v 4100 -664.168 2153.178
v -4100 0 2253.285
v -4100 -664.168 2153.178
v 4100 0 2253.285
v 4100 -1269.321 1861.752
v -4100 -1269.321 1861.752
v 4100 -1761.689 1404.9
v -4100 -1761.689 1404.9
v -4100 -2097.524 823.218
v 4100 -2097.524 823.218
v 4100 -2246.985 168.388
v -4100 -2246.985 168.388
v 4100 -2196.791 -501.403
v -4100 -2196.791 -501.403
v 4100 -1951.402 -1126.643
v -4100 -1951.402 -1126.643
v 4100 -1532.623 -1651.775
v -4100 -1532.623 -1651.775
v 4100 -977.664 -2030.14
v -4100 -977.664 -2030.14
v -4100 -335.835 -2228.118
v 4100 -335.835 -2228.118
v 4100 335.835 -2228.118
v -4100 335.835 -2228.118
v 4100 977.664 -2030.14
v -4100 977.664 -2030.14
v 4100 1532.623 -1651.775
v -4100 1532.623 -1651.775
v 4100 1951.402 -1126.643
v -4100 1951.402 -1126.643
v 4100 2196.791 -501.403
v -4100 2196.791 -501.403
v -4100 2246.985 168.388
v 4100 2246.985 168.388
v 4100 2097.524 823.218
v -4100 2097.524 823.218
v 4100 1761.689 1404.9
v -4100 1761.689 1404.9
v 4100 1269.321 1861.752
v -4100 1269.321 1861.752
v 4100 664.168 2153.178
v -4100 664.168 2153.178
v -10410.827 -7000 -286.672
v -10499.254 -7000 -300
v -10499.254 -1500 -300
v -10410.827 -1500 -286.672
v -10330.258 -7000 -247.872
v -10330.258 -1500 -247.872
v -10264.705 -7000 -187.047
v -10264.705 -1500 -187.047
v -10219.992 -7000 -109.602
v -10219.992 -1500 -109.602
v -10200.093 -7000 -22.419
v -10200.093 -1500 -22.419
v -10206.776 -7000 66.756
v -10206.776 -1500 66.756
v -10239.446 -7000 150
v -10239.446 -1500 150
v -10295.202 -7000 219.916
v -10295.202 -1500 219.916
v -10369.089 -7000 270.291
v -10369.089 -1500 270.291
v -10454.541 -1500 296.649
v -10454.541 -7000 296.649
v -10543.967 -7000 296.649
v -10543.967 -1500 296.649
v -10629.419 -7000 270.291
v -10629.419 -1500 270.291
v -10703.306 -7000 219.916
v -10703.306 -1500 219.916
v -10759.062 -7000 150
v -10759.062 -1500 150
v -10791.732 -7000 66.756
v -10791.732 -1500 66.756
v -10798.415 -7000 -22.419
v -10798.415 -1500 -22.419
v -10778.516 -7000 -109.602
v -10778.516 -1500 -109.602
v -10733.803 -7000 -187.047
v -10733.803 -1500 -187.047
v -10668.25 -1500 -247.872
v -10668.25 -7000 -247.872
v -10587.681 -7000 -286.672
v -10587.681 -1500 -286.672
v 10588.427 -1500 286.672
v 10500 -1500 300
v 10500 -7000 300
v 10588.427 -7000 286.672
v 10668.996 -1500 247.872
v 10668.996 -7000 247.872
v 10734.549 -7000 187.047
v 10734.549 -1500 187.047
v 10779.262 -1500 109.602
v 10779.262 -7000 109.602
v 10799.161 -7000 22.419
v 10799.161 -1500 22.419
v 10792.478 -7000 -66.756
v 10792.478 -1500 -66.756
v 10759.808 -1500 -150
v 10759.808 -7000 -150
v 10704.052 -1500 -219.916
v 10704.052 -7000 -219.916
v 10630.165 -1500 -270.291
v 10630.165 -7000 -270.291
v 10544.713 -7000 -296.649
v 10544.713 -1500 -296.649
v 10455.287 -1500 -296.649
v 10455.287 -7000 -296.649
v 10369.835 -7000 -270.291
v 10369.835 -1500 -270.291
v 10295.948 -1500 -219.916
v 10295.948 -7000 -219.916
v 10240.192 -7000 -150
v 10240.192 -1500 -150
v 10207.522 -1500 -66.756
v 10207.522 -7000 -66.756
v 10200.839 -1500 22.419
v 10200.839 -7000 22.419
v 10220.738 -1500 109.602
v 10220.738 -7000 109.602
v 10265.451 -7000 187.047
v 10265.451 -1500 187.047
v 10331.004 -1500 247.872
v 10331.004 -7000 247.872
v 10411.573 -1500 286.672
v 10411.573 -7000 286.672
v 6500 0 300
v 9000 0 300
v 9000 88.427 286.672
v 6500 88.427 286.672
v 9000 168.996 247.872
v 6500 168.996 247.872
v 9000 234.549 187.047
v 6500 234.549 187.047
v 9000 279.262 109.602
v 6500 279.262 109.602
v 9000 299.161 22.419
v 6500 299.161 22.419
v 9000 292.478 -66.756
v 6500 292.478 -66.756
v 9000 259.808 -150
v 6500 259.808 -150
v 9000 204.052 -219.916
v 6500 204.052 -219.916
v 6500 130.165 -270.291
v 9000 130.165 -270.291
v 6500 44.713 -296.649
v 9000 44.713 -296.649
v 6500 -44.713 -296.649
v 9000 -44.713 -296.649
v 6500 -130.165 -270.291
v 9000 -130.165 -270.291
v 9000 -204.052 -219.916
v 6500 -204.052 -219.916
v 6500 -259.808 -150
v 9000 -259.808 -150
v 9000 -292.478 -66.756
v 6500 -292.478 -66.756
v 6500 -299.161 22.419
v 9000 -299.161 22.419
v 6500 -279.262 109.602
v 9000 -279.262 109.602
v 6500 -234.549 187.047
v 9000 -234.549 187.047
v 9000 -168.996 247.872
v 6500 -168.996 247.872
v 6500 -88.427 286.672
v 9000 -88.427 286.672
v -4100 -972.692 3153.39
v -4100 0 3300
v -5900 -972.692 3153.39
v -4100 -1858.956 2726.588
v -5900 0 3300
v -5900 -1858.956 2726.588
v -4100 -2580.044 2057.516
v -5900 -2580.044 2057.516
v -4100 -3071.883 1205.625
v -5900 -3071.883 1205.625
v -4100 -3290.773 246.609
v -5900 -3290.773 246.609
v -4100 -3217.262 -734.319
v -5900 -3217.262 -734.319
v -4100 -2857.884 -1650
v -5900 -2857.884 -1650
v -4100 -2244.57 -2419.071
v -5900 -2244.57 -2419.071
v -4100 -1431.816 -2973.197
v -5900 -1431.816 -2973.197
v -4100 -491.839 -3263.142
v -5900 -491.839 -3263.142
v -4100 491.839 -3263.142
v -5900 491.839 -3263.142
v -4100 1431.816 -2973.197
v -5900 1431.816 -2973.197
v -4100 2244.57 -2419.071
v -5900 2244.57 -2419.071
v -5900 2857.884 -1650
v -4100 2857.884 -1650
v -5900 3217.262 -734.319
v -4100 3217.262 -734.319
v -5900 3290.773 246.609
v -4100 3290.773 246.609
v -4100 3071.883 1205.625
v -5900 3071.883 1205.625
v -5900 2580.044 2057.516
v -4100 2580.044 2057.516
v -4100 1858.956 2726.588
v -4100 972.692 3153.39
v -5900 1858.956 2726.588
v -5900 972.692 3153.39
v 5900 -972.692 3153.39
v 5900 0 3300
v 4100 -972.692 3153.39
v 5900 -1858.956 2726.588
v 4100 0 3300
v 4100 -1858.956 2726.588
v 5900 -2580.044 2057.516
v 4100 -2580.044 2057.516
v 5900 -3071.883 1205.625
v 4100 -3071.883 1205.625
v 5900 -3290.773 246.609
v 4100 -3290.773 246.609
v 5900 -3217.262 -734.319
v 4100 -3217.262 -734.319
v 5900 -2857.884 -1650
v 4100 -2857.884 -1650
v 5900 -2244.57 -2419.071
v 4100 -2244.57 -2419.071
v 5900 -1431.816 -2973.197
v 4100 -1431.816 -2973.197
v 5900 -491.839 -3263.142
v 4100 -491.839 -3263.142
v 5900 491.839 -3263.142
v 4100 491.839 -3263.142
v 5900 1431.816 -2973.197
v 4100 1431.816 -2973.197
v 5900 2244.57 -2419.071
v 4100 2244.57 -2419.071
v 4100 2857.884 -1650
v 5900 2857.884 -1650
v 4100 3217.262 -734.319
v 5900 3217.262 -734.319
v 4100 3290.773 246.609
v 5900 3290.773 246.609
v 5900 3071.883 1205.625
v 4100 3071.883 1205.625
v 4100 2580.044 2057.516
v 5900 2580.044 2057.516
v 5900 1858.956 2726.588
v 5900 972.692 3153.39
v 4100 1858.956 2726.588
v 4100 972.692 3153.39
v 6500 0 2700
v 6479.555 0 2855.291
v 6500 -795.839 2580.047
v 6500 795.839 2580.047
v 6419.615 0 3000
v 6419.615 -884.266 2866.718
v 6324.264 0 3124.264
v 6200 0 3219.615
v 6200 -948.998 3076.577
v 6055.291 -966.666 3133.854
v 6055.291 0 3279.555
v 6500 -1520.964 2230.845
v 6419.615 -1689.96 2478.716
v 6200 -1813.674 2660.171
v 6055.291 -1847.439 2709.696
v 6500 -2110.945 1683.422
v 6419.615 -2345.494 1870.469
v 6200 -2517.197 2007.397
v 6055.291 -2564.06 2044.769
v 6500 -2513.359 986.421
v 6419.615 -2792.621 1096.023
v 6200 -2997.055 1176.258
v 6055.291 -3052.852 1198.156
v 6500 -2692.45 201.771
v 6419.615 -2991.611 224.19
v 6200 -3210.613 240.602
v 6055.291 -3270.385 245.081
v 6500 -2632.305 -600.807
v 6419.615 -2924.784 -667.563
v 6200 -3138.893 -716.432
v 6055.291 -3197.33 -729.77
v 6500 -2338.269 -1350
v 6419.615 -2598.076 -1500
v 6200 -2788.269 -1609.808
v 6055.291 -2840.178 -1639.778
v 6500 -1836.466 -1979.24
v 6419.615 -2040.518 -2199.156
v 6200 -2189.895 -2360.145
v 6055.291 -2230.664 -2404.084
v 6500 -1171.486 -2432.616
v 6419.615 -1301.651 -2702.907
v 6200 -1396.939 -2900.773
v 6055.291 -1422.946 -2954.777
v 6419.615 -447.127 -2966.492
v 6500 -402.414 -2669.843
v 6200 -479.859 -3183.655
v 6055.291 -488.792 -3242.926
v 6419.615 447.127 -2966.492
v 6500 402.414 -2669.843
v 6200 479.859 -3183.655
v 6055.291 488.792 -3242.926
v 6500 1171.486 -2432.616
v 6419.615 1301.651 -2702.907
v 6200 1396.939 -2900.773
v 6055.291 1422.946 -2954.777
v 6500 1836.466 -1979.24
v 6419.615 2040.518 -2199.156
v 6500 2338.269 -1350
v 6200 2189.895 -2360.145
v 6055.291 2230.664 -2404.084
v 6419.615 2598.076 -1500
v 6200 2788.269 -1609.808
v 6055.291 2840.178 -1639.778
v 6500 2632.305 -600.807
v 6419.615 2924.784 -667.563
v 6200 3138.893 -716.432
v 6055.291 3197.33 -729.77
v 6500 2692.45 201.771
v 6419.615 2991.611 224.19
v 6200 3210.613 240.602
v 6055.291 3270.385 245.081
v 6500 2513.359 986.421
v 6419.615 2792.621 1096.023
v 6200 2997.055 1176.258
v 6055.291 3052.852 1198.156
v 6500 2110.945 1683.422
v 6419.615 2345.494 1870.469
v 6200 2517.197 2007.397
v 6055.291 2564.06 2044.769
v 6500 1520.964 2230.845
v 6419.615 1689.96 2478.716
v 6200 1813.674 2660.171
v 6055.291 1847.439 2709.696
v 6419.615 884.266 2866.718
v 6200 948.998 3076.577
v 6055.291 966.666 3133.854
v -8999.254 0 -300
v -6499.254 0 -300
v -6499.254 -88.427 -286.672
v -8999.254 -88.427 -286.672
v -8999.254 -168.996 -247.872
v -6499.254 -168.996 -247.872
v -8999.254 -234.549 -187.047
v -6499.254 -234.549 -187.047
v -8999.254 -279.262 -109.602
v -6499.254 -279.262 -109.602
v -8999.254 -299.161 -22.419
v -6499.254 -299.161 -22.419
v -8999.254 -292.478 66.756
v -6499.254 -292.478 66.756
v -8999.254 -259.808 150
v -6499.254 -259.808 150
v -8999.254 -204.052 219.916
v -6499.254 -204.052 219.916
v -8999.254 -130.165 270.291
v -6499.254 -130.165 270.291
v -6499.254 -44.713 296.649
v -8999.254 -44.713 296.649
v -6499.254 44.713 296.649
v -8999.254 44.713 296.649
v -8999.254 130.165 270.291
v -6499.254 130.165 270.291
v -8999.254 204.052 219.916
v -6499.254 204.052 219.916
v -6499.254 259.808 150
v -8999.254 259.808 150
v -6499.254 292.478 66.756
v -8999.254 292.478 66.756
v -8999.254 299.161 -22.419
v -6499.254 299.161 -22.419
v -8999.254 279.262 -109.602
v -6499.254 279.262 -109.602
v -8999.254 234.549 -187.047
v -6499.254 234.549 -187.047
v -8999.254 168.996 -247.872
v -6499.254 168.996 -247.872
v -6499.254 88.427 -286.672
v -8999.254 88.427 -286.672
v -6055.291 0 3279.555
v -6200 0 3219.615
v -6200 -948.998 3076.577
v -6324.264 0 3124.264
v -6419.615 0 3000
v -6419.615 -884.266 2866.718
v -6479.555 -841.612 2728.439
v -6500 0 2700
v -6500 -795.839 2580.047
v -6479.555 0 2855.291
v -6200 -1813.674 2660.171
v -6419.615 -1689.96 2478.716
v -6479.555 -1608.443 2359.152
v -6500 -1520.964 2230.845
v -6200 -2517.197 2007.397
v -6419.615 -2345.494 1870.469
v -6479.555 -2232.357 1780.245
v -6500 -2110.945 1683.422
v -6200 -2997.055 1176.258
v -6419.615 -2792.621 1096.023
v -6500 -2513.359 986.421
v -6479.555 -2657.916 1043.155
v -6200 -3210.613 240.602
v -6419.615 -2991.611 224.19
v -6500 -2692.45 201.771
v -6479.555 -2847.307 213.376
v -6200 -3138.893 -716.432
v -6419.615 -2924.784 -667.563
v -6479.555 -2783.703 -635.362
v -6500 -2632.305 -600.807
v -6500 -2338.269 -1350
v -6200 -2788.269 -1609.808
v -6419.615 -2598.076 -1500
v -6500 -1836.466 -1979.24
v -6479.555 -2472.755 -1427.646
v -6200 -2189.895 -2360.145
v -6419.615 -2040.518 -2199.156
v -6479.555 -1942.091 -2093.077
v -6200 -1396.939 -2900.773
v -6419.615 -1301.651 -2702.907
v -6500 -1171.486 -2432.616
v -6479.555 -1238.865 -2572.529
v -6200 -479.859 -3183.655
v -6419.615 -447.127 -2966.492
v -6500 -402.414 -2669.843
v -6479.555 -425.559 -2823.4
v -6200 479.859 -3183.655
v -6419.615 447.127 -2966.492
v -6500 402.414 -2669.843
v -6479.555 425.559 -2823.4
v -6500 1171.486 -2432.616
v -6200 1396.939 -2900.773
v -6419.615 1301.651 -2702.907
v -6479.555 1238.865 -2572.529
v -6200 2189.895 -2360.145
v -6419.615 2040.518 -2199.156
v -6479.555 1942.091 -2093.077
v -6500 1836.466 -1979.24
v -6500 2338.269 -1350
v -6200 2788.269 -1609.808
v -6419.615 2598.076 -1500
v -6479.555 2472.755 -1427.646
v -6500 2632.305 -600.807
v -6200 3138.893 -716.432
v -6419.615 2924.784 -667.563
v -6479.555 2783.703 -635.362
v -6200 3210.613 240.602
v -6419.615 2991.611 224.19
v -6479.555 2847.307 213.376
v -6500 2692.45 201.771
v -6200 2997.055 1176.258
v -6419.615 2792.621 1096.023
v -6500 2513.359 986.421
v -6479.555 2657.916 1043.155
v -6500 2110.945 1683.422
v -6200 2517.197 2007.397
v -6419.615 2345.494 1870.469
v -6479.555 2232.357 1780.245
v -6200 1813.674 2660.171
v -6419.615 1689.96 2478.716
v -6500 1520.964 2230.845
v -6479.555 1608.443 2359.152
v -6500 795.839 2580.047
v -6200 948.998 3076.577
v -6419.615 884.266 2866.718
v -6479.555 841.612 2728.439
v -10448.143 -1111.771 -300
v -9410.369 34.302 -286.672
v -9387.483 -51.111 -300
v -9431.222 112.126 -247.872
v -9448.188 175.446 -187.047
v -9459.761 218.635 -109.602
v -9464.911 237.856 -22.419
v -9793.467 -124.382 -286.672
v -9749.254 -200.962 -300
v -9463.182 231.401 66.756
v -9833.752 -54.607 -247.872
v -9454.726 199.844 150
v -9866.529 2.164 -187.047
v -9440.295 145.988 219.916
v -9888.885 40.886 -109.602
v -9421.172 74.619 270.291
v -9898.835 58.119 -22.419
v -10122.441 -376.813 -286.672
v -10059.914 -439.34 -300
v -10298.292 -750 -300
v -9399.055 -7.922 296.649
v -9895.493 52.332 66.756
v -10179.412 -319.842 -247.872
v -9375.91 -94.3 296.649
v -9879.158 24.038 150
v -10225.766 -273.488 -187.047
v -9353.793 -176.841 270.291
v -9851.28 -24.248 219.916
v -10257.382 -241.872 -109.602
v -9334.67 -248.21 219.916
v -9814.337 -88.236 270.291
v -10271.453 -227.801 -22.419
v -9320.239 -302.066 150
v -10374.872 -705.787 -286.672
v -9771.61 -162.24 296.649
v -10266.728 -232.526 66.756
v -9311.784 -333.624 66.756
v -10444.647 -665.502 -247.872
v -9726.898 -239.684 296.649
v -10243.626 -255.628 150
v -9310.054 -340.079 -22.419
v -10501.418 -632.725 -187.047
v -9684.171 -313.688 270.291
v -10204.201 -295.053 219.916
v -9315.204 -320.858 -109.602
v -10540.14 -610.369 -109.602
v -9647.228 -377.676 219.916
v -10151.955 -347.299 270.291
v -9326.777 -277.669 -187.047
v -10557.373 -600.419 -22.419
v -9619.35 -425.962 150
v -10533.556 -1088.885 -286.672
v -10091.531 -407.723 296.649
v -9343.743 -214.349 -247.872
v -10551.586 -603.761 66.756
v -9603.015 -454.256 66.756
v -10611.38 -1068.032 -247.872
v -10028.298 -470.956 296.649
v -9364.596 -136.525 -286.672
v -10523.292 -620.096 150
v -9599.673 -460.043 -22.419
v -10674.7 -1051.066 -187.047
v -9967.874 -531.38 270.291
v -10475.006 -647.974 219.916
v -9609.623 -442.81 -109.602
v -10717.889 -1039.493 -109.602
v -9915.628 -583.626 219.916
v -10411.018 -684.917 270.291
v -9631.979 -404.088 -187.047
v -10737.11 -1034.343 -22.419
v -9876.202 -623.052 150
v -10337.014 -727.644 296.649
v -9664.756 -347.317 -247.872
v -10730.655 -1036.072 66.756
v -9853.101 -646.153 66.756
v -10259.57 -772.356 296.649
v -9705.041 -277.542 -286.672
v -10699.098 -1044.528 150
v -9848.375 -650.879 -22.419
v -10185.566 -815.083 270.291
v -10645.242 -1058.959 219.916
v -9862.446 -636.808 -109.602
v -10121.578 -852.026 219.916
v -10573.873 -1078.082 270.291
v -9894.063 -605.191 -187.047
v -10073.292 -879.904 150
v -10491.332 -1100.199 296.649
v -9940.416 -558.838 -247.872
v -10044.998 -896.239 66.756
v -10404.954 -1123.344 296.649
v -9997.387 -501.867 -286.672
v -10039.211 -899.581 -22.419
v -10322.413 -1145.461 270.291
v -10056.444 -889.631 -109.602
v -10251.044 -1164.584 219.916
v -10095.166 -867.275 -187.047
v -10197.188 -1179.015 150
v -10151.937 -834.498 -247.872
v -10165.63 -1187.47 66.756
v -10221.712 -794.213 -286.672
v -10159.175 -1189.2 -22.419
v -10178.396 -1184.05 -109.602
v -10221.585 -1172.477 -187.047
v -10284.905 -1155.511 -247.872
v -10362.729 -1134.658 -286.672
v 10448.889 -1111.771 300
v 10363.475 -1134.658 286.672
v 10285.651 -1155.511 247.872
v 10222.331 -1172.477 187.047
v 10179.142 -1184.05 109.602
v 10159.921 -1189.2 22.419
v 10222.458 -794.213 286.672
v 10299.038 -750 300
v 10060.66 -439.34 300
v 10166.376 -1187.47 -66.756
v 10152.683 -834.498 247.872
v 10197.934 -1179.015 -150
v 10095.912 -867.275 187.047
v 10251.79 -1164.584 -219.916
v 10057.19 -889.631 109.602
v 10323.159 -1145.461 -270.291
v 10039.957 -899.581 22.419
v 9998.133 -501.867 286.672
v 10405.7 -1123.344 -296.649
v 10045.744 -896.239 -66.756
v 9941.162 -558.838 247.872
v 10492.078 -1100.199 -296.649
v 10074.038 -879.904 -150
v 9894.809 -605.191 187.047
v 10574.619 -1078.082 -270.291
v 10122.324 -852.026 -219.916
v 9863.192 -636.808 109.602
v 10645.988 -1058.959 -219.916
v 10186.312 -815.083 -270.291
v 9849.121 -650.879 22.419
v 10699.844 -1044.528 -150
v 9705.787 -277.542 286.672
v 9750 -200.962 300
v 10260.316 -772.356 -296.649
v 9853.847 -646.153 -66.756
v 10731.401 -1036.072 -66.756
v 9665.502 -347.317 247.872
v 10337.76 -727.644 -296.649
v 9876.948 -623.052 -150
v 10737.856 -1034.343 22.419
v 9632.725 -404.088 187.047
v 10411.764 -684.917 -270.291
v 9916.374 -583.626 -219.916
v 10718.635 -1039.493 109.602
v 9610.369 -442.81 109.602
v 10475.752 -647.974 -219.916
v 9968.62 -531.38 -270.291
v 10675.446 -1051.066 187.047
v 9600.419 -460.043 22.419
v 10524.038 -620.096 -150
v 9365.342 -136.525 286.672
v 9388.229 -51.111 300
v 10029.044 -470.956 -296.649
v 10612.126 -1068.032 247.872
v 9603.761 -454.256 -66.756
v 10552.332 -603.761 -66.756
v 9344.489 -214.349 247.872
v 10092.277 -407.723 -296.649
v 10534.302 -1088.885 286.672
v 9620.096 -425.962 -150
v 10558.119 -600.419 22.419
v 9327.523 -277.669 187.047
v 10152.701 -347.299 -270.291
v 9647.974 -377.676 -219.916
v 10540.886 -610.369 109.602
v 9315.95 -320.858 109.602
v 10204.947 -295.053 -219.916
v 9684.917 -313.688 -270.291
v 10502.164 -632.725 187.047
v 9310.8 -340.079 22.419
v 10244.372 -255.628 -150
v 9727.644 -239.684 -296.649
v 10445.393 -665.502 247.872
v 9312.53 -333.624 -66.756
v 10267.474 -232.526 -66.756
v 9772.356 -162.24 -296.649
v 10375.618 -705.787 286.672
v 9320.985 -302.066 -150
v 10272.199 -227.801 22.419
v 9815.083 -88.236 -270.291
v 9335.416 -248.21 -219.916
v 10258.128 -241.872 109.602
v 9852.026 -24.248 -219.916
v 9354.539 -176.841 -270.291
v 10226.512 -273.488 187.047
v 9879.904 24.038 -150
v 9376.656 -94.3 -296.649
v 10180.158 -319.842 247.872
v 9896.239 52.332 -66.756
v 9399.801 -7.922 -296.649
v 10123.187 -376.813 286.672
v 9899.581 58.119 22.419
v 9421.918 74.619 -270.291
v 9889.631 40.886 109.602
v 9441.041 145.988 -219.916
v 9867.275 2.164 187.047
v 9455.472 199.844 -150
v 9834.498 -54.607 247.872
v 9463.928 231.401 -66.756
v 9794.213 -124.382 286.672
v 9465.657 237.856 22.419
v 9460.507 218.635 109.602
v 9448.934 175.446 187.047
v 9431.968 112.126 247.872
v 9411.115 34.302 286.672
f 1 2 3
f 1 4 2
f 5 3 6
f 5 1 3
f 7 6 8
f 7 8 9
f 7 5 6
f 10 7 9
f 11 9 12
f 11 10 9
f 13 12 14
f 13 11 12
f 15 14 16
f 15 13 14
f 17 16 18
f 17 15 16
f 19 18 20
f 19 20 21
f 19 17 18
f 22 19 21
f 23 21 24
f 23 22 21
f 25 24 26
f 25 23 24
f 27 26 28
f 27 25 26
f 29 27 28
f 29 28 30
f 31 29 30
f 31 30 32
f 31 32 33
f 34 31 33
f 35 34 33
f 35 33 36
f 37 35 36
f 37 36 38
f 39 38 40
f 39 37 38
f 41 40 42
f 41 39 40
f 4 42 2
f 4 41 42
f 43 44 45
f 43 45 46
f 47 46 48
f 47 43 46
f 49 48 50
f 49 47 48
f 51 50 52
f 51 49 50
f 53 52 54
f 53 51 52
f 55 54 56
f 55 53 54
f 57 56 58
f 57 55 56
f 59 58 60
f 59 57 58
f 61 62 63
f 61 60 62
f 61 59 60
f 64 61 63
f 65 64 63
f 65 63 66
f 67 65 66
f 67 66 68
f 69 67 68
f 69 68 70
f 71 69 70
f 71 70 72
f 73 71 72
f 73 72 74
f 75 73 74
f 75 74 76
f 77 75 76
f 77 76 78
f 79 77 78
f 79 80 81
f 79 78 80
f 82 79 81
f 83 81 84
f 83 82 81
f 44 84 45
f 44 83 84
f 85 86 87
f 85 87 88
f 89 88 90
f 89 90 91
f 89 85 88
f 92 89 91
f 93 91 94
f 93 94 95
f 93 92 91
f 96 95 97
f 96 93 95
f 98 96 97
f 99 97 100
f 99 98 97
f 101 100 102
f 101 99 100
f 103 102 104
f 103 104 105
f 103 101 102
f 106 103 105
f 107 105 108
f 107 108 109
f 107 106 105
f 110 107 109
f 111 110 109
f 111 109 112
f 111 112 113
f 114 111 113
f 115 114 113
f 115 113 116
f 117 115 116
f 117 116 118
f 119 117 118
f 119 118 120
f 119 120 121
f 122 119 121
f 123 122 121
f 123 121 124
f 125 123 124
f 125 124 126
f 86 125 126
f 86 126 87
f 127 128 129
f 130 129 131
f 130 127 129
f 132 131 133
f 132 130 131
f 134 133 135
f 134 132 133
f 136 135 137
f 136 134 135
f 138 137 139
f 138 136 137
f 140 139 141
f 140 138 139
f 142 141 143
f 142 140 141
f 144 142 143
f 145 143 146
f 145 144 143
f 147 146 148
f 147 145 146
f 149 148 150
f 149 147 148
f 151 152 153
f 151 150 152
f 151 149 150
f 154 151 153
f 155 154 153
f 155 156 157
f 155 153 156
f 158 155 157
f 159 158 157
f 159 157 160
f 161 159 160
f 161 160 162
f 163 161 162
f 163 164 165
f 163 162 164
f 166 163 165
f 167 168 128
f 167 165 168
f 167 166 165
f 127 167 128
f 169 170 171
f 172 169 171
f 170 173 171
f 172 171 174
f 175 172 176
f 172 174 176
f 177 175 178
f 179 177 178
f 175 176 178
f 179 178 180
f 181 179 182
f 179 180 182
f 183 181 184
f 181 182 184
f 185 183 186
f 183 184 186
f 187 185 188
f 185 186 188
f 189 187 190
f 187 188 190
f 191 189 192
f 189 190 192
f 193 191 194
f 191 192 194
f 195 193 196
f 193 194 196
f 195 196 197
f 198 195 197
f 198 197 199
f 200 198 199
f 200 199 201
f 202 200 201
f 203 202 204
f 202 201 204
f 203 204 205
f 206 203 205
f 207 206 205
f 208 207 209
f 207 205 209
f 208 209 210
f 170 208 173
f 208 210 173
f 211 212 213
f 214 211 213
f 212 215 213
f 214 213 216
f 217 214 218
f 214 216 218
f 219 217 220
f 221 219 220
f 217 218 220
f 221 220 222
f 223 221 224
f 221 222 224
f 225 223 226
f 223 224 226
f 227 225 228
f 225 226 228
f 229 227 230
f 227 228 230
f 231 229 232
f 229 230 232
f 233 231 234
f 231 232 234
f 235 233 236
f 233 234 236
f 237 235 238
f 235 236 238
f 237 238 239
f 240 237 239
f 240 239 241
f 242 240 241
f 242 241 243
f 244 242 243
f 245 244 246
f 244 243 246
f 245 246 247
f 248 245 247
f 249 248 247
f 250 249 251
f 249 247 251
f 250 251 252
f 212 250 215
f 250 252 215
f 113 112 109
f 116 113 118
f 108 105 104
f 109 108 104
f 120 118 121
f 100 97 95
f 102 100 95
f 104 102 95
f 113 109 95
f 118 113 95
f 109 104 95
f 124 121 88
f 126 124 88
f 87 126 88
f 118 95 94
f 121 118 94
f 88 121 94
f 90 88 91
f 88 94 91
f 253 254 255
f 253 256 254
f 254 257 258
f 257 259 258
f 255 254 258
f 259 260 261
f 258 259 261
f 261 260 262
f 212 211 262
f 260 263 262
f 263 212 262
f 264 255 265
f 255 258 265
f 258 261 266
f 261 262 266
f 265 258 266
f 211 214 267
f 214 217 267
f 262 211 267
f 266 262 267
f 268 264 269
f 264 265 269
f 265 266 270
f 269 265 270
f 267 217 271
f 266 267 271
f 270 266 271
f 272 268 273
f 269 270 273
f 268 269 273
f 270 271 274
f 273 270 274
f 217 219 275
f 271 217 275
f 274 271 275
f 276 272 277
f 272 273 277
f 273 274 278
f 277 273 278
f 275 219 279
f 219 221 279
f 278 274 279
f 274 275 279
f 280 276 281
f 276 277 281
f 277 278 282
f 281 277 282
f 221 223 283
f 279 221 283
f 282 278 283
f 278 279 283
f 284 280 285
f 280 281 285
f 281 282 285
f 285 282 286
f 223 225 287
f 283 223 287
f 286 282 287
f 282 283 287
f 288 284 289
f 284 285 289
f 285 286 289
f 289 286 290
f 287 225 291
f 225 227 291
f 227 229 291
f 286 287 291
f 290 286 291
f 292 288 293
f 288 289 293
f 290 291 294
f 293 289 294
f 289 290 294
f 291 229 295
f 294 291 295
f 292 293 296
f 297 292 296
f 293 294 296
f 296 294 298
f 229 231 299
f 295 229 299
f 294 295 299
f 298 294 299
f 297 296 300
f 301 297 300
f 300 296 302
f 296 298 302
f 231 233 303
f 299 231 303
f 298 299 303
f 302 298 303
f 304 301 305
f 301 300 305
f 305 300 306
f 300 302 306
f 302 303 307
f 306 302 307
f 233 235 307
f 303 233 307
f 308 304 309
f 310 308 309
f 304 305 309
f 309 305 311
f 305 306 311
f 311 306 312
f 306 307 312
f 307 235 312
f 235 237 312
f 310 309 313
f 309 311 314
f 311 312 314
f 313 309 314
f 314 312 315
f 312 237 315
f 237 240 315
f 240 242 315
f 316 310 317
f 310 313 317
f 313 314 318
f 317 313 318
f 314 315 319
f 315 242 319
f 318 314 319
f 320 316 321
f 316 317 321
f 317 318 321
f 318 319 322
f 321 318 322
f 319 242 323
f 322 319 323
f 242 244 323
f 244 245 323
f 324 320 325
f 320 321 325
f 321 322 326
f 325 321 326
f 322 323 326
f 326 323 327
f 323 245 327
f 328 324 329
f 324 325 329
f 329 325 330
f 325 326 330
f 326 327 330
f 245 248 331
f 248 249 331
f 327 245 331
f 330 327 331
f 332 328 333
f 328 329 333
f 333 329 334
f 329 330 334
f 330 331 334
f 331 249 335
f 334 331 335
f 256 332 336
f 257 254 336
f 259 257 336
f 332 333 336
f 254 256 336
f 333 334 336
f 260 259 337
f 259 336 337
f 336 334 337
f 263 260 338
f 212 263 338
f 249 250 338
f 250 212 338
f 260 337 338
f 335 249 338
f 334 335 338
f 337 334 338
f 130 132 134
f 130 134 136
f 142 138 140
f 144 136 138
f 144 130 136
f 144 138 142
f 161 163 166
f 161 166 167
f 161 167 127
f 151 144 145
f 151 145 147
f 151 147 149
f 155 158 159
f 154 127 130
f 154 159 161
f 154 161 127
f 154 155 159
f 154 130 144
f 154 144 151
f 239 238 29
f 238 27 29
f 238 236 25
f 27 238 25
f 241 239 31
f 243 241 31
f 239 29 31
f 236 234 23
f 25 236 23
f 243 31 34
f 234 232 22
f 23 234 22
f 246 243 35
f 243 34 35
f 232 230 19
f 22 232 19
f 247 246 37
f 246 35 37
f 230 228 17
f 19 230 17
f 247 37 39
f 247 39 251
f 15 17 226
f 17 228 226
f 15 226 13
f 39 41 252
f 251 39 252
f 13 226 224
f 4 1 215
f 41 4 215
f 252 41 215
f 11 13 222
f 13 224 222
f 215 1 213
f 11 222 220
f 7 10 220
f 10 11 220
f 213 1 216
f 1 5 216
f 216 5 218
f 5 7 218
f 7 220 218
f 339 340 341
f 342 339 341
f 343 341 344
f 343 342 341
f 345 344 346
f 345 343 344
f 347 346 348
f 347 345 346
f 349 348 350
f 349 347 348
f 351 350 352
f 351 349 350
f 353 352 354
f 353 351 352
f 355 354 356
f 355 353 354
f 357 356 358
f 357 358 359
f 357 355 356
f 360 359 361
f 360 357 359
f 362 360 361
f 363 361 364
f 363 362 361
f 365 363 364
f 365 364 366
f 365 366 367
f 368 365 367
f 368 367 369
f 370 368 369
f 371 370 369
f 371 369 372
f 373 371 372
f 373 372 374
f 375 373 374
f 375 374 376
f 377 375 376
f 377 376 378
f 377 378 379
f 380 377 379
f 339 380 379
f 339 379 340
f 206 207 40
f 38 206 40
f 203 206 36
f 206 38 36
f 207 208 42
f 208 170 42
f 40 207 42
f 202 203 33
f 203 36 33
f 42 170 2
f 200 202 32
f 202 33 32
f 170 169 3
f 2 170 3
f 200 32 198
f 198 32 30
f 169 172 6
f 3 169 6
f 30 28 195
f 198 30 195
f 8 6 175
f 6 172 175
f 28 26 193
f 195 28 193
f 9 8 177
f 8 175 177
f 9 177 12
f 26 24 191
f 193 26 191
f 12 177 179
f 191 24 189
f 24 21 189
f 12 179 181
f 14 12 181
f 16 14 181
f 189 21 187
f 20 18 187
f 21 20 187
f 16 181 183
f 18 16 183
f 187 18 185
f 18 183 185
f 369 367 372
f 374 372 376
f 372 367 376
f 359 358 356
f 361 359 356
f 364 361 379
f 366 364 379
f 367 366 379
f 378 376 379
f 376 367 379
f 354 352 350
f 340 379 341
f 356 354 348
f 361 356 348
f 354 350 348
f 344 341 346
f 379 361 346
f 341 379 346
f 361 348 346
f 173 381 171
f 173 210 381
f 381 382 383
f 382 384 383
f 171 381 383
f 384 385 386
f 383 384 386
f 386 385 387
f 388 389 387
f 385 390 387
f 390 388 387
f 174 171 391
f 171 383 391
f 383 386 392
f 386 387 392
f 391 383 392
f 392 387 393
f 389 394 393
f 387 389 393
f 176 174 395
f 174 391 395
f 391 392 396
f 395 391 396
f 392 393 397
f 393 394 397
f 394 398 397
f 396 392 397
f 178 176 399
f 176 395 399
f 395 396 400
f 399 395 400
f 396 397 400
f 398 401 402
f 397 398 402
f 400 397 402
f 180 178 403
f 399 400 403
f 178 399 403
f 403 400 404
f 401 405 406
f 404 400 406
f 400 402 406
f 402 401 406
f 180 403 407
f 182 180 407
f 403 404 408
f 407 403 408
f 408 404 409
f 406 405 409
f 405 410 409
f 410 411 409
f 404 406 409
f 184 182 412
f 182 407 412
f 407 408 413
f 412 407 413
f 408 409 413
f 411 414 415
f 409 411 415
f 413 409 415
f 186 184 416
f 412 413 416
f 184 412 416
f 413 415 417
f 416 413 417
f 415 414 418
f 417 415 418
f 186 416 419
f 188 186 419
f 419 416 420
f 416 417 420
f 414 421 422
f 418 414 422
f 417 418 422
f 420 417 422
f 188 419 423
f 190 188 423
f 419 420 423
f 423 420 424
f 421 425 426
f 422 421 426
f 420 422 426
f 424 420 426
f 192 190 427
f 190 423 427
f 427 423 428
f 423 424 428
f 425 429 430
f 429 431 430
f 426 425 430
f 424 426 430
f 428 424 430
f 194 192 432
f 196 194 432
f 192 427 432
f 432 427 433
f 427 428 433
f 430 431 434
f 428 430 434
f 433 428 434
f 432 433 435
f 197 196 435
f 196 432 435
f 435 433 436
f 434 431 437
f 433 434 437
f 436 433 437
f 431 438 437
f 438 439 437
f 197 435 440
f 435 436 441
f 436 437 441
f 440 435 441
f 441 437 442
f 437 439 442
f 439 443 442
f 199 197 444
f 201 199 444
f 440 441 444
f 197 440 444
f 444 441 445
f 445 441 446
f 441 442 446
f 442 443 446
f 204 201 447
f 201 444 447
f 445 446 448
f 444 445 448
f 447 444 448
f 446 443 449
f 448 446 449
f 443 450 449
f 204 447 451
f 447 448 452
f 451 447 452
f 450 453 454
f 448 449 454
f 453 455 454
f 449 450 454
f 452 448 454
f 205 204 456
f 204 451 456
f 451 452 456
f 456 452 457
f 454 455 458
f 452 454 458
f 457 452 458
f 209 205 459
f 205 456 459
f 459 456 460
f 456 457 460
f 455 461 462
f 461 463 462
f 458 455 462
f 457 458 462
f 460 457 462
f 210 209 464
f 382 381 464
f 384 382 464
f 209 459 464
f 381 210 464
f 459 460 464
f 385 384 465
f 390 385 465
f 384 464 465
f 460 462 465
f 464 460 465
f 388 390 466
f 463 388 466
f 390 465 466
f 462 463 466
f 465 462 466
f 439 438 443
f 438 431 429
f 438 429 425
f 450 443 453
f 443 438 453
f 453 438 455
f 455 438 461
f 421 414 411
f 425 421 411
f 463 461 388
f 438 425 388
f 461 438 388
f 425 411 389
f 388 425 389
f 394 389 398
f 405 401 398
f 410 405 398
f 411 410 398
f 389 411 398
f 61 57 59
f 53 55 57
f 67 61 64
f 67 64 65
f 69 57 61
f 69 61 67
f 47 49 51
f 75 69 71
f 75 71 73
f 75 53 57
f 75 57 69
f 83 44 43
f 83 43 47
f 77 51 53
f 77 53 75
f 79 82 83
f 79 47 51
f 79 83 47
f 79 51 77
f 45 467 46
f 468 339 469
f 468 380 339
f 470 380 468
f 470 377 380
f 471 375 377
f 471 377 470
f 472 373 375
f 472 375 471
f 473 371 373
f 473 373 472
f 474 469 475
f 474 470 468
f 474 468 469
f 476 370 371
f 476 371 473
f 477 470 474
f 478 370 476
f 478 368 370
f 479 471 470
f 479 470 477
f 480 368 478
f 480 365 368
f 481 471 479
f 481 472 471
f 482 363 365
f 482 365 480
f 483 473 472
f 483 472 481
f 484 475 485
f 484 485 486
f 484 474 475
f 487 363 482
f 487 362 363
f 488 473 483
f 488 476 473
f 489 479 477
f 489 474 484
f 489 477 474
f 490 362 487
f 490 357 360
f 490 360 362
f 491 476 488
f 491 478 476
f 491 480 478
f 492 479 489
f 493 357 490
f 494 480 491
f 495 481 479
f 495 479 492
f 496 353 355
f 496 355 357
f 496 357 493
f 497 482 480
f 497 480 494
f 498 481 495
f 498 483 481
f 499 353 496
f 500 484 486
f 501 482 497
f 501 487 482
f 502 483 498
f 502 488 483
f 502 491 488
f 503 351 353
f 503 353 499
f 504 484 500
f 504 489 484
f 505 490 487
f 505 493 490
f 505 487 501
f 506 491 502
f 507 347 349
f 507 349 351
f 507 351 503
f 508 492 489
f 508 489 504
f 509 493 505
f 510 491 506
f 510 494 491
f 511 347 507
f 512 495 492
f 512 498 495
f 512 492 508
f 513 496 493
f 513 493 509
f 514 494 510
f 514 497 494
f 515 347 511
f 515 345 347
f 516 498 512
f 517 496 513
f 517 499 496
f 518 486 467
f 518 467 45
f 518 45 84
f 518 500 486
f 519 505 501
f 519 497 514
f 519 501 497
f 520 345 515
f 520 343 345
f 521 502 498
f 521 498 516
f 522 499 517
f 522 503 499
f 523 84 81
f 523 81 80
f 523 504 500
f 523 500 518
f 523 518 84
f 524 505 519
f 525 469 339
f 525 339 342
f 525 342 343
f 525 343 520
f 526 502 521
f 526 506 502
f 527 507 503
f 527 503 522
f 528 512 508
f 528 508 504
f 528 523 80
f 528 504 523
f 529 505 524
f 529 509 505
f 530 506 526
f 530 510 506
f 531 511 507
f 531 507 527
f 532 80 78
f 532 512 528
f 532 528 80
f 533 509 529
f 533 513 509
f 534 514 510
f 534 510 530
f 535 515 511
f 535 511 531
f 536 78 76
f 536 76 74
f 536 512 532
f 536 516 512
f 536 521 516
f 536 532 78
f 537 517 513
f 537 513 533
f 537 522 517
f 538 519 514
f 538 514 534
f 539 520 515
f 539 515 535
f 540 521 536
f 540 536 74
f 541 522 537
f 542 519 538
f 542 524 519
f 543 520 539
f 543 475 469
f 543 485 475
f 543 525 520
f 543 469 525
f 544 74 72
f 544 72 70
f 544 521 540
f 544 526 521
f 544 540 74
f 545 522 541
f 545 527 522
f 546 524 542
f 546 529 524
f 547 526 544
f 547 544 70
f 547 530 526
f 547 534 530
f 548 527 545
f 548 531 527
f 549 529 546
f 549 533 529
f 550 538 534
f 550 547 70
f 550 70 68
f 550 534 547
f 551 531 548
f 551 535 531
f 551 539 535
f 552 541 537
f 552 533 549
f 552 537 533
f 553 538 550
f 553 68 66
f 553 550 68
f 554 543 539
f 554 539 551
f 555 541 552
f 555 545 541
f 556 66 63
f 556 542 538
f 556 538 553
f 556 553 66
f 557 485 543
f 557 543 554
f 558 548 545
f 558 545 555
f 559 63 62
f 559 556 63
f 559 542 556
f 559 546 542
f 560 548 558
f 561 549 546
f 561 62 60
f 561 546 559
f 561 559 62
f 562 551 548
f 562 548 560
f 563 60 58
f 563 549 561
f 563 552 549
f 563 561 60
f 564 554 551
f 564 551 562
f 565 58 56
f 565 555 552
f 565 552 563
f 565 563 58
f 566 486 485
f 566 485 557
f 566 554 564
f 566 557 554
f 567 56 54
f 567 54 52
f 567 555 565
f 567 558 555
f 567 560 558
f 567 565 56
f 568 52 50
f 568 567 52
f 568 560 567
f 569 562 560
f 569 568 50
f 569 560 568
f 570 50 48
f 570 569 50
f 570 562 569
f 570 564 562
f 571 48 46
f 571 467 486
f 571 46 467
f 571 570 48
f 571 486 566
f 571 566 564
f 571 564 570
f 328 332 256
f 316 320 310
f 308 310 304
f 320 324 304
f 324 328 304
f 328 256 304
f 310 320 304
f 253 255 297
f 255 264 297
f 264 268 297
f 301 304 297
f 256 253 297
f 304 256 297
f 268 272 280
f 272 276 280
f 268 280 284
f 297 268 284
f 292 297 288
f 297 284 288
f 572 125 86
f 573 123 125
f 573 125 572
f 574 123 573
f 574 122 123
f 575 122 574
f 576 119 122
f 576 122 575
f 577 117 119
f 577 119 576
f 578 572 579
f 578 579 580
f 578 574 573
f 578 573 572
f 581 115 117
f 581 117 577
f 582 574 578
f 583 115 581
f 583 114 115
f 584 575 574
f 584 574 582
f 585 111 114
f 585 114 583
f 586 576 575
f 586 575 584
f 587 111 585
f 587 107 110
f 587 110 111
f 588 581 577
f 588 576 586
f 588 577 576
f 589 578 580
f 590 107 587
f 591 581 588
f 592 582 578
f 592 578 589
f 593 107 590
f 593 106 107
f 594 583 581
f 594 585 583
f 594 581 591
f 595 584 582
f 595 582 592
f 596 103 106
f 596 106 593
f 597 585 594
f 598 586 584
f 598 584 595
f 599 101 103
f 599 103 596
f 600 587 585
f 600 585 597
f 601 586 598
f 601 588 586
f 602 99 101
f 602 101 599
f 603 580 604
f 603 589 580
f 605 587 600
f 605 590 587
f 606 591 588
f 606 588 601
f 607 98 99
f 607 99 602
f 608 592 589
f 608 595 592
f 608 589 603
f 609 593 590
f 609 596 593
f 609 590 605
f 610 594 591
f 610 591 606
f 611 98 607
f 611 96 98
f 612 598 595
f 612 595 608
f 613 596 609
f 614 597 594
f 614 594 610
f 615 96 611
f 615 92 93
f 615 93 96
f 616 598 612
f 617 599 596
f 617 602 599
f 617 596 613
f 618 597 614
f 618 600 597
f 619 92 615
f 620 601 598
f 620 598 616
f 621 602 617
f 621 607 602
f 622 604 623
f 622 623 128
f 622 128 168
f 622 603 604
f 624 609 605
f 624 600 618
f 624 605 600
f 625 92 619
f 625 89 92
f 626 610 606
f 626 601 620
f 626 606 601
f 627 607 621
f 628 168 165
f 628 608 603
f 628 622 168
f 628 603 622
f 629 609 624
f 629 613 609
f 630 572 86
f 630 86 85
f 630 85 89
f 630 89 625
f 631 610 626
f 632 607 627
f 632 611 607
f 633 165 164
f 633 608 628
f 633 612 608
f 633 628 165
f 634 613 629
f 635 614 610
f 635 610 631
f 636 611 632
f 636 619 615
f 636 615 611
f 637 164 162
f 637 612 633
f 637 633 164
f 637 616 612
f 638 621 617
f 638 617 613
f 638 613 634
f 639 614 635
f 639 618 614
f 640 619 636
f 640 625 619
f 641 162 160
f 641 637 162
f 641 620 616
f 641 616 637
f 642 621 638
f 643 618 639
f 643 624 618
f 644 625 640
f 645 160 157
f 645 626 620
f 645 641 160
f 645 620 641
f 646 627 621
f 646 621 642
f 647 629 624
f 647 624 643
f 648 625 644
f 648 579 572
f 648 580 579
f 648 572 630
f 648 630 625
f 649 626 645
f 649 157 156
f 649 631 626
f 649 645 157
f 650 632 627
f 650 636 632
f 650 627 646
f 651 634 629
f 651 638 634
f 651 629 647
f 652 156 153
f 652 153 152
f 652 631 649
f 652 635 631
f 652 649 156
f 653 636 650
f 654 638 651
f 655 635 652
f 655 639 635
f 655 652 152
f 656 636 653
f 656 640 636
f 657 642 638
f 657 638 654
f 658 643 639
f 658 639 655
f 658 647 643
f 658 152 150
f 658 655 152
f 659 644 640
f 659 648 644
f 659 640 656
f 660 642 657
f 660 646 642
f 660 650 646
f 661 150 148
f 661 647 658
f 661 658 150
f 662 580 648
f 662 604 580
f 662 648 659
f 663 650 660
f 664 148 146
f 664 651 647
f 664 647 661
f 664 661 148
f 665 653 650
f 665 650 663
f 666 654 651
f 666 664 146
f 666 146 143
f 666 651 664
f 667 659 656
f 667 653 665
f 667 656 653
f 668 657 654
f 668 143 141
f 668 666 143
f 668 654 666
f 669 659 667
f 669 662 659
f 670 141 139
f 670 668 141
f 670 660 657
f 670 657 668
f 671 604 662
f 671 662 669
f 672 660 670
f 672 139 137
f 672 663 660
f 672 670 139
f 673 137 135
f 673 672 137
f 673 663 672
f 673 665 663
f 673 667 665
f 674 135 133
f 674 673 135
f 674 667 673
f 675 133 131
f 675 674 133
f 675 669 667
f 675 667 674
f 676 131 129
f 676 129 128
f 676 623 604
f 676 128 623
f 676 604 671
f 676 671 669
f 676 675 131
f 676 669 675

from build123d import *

# Parameters (mm, degrees)
SWEEP1_PROFILE_R = 300
SWEEP2_PROFILE_R = 300
SKETCH1_W        = 8200
SKETCH1_H        = 2253.285346905


with BuildPart() as part:
    # Sweep1: sweep along a path in Sketch4
    with BuildLine(Plane.XY) as sweep1_path:
        Line((10500, -7000), (10500, -1500))
        ThreePointArc((10500, -1500), (10060.66017178, -439.33982822), (9000, 0))
        Line((9000, 0), (6500, 0))
    # Sweep1 profile (on start of the path) → Sweep1 (sweep)
    with BuildSketch(Plane(origin=(10500, -7000, 0), x_dir=(0, 0, 1), z_dir=(0, 1, 0))):
        Circle(SWEEP1_PROFILE_R)
    sweep(path=sweep1_path.line)


with BuildPart() as body_2:
    # Sweep2: sweep along a path in Sketch3
    with BuildLine(Plane.XY) as sweep2_path:
        Line((-6499.25397283, 0), (-8999.25397283, 0))
        ThreePointArc((-8999.25397283, 0), (-10059.91414461, -439.33982822), (-10499.25397283, -1500))
        Line((-10499.25397283, -1500), (-10499.25397283, -7000))
    # Sweep2 profile (on start of the path) → Sweep2 (sweep)
    with BuildSketch(Plane(origin=(-6499.25397283, 0, 0), x_dir=(0, 0, -1), z_dir=(-1, 0, 0))):
        Circle(SWEEP2_PROFILE_R)
    sweep(path=sweep2_path.line)


with BuildPart() as body_3:
    # Sketch1 → Revolve2 (revolve)
    with BuildSketch(Plane(origin=(0, 0, 0), x_dir=(1, 0, 0), z_dir=(0, 1, 0)), mode=Mode.PRIVATE) as revolve2_sk:
        with BuildLine():
            Line((4100, 2253.285346905), (4100, 0))
            Line((4100, 0), (6500, 0))
            Line((6500, 0), (6500, 2700))
            ThreePointArc((6500, 2700), (6324.264068712, 3124.264068712), (5900, 3300))
            Line((5900, 3300), (4100, 3300))
            Line((4100, 3300), (4100, 2253.285346905))
        make_face()
        with Locations((0, 1126.642673453)):
            Rectangle(SKETCH1_W, SKETCH1_H)
        with BuildLine():
            ThreePointArc((-5900, 3300), (-6324.264068712, 3124.264068712), (-6500, 2700))
            Line((-6500, 2700), (-6500, 0))
            Line((-6500, 0), (-4100, 0))
            Line((-4100, 0), (-4100, 2253.285346905))
            Line((-4100, 2253.285346905), (-4100, 3300))
            Line((-4100, 3300), (-5900, 3300))
        make_face()
    revolve(revolve2_sk.sketch.rotate(Axis((-12281.118467832, 0, 0), (1, 0, 0)), 180), axis=Axis((-12281.118467832, 0, 0), (1, 0, 0)))


solid = Compound([part.part, body_2.part, body_3.part])
